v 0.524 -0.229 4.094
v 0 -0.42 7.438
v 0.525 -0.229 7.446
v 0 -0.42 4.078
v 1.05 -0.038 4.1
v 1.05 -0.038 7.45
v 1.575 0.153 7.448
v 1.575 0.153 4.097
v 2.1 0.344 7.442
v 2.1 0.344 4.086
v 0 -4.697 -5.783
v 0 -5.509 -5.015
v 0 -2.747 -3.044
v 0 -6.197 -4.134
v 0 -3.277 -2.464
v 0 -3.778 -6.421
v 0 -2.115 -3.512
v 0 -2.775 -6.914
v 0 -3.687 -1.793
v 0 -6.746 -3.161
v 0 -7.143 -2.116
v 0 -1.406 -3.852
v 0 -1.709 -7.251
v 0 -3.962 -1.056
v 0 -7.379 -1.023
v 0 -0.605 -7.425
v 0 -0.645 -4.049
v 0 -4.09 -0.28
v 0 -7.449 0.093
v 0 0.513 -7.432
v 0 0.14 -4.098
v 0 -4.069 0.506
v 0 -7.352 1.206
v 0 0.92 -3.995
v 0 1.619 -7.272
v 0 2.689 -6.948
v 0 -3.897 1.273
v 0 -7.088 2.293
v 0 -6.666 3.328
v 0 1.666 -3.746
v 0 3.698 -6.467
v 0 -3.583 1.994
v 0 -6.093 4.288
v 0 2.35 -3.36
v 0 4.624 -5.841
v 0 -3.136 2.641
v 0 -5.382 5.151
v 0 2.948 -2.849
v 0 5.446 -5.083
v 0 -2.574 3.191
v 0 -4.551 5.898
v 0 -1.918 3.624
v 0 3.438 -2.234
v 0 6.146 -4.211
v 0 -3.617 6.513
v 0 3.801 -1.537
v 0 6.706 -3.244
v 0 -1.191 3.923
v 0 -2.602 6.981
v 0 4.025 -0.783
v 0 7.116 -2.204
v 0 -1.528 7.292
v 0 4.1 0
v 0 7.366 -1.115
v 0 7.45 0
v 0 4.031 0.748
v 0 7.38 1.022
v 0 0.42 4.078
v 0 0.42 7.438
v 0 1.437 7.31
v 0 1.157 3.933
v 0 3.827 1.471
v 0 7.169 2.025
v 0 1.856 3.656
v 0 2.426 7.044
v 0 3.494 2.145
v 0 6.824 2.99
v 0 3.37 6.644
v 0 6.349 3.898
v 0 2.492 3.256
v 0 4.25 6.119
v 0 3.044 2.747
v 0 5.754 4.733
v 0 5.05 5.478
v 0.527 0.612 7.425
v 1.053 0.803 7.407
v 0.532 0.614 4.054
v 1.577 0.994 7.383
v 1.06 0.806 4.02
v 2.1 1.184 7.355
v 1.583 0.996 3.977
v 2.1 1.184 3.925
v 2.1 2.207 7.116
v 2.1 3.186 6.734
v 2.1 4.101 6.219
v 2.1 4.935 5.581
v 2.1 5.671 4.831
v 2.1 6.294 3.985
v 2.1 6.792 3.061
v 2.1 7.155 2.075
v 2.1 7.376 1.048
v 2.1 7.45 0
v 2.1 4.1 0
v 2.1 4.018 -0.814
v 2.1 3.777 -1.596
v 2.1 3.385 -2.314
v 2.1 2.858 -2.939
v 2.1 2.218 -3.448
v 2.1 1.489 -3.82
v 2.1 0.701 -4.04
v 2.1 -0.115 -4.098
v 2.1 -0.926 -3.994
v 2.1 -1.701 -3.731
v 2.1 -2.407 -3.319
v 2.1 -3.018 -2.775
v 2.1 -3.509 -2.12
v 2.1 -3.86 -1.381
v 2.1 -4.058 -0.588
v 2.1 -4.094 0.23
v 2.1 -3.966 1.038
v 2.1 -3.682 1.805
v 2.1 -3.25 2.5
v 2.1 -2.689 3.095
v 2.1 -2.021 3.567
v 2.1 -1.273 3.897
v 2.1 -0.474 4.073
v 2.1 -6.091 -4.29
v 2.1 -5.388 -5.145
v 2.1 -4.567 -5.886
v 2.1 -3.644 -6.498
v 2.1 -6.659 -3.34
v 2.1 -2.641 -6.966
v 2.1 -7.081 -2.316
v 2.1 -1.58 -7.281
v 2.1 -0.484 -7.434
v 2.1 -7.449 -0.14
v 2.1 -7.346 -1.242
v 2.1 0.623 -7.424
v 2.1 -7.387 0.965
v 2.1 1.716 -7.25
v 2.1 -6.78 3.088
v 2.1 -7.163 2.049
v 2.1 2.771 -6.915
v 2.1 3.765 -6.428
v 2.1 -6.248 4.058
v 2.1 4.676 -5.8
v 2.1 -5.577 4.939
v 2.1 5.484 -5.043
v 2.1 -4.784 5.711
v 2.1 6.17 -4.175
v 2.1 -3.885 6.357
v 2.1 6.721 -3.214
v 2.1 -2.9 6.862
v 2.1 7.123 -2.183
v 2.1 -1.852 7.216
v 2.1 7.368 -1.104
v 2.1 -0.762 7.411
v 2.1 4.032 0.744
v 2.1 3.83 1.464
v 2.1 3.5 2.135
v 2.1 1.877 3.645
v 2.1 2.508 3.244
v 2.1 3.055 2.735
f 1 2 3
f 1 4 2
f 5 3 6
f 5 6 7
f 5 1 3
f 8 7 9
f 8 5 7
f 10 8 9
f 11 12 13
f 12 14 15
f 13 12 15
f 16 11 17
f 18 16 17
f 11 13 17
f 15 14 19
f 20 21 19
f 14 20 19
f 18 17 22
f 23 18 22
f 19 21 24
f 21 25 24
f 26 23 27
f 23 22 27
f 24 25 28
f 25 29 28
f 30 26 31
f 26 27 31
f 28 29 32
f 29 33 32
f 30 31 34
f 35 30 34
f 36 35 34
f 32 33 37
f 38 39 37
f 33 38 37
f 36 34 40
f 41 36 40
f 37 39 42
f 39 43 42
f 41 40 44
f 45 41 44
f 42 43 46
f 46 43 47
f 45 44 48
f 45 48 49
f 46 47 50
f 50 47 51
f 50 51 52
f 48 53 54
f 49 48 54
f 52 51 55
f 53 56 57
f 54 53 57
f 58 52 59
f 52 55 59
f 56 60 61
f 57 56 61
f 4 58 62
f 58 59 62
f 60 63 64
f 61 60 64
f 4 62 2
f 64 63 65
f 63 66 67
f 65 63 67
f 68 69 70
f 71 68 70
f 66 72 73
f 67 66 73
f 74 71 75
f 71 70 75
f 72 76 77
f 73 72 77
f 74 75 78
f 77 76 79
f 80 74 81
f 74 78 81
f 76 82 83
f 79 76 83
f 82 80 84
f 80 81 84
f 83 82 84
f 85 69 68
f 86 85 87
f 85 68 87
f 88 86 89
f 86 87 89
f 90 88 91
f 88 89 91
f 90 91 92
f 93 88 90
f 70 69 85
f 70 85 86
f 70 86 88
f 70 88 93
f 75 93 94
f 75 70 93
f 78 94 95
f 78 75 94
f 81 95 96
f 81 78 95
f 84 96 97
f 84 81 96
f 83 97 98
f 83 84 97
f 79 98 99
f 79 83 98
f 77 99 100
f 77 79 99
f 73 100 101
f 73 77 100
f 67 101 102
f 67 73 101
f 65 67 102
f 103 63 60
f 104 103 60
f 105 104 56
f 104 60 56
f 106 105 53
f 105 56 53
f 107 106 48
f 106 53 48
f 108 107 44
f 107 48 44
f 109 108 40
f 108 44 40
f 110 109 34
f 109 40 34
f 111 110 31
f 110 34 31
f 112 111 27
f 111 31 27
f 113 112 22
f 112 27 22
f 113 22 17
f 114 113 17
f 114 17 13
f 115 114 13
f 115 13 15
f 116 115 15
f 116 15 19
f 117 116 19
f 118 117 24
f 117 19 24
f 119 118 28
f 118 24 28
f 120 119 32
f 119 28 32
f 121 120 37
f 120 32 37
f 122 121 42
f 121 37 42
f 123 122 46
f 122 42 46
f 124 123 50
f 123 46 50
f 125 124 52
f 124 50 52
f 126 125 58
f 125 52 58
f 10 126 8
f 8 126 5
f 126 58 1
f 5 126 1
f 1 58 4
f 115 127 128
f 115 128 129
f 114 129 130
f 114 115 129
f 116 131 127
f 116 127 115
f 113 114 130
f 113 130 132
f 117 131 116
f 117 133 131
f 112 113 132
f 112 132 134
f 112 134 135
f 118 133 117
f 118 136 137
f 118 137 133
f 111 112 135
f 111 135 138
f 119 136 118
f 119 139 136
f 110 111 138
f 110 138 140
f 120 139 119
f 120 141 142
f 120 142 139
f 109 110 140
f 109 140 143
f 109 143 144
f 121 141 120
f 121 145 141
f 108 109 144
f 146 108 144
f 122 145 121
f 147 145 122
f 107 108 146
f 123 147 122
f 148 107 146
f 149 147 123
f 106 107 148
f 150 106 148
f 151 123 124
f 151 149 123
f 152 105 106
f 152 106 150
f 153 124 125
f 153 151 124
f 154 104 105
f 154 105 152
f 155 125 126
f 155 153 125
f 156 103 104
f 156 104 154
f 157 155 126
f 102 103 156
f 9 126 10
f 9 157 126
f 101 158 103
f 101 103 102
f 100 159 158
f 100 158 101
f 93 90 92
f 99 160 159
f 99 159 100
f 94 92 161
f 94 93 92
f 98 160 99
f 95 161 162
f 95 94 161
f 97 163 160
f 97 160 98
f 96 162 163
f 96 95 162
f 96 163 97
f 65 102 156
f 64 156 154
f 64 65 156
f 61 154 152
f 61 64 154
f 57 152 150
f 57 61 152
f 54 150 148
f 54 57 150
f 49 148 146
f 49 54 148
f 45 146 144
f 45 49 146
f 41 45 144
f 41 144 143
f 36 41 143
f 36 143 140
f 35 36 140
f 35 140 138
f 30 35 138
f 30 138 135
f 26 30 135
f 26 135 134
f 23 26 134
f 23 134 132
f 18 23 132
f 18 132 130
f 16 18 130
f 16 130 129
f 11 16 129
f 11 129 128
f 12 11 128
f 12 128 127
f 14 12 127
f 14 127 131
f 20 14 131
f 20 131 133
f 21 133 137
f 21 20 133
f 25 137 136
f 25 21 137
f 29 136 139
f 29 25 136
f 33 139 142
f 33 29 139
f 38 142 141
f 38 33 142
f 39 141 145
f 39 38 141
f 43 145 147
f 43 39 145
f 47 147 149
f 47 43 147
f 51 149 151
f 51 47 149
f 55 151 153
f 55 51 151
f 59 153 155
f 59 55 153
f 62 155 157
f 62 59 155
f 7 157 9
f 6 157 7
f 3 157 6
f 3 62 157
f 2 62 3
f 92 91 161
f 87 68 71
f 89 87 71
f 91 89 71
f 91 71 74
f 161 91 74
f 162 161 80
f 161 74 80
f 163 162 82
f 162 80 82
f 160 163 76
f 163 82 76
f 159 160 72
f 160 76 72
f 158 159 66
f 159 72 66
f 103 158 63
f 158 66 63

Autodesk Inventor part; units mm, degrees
ref_plane "YZ Plane" through (0, 0, 0) normal (1, 0, 0) x (0, 1, 0)
ref_plane "XZ Plane" through (0, 0, 0) normal (0, 1, 0) x (-1, 0, 0)
sketch "Sketch1" plane through (0, 0, 0) normal (1, 0, 0) x (0, 1, 0)
  circle A0 centre (0, 0) radius 7.45
  circle A1 centre (0, 0) radius 4.1
  dimension "d0" = 8.2
  dimension "d1" = 14.9
extrude "Body" add sketch "Sketch1" along normal blind 2.1
sketch "Sketch2" plane through (0, 0, 0) normal (0, 0, 1) x (1, 0, 0)
  line L0 (0, -4.1) -> (0, 4.1) projected
  line L1 (2.1, 7.45) -> (2.1, -7.45) projected
  line L2 (-1.2, 0) -> (7.2, 0) projected
  line L3 (0, -0.42) -> (2.1, 0.3443)
  line L4 (0, 0.42) -> (2.1, 1.1843)
  dimension "d4" = 0.42
  dimension "d5" = 0.42
  dimension "d6" = 70
extrude "Cut" cut sketch "Sketch2" along normal up to next contours L0 L2 L3 | L0 L4 L1 L3 L2
ref_plane "Work Plane1" through (0, 0, 0) normal (0, -1, 0) x (1, 0, 0)
equation "\"d0\" = SD1"
equation "\"d1\" = SD2"
equation "\"d2\" = SD"
equation "\"d4\" = 0.2 * SD"
equation "\"d5\" = 0.2 * SD"
equation "\"d6\" = FAWI"
equation "\"d7\" = SD"
equation "\"SD1\" = 8.2"
equation "\"SD2\" = 14.9"
equation "\"SD\" = 2.1"
equation "\"FAWI\" = 70deg"
equation "\"NND\" = 8"
properties part number "AS 1968 - 1976 - 8" material "Steel, Mild"
